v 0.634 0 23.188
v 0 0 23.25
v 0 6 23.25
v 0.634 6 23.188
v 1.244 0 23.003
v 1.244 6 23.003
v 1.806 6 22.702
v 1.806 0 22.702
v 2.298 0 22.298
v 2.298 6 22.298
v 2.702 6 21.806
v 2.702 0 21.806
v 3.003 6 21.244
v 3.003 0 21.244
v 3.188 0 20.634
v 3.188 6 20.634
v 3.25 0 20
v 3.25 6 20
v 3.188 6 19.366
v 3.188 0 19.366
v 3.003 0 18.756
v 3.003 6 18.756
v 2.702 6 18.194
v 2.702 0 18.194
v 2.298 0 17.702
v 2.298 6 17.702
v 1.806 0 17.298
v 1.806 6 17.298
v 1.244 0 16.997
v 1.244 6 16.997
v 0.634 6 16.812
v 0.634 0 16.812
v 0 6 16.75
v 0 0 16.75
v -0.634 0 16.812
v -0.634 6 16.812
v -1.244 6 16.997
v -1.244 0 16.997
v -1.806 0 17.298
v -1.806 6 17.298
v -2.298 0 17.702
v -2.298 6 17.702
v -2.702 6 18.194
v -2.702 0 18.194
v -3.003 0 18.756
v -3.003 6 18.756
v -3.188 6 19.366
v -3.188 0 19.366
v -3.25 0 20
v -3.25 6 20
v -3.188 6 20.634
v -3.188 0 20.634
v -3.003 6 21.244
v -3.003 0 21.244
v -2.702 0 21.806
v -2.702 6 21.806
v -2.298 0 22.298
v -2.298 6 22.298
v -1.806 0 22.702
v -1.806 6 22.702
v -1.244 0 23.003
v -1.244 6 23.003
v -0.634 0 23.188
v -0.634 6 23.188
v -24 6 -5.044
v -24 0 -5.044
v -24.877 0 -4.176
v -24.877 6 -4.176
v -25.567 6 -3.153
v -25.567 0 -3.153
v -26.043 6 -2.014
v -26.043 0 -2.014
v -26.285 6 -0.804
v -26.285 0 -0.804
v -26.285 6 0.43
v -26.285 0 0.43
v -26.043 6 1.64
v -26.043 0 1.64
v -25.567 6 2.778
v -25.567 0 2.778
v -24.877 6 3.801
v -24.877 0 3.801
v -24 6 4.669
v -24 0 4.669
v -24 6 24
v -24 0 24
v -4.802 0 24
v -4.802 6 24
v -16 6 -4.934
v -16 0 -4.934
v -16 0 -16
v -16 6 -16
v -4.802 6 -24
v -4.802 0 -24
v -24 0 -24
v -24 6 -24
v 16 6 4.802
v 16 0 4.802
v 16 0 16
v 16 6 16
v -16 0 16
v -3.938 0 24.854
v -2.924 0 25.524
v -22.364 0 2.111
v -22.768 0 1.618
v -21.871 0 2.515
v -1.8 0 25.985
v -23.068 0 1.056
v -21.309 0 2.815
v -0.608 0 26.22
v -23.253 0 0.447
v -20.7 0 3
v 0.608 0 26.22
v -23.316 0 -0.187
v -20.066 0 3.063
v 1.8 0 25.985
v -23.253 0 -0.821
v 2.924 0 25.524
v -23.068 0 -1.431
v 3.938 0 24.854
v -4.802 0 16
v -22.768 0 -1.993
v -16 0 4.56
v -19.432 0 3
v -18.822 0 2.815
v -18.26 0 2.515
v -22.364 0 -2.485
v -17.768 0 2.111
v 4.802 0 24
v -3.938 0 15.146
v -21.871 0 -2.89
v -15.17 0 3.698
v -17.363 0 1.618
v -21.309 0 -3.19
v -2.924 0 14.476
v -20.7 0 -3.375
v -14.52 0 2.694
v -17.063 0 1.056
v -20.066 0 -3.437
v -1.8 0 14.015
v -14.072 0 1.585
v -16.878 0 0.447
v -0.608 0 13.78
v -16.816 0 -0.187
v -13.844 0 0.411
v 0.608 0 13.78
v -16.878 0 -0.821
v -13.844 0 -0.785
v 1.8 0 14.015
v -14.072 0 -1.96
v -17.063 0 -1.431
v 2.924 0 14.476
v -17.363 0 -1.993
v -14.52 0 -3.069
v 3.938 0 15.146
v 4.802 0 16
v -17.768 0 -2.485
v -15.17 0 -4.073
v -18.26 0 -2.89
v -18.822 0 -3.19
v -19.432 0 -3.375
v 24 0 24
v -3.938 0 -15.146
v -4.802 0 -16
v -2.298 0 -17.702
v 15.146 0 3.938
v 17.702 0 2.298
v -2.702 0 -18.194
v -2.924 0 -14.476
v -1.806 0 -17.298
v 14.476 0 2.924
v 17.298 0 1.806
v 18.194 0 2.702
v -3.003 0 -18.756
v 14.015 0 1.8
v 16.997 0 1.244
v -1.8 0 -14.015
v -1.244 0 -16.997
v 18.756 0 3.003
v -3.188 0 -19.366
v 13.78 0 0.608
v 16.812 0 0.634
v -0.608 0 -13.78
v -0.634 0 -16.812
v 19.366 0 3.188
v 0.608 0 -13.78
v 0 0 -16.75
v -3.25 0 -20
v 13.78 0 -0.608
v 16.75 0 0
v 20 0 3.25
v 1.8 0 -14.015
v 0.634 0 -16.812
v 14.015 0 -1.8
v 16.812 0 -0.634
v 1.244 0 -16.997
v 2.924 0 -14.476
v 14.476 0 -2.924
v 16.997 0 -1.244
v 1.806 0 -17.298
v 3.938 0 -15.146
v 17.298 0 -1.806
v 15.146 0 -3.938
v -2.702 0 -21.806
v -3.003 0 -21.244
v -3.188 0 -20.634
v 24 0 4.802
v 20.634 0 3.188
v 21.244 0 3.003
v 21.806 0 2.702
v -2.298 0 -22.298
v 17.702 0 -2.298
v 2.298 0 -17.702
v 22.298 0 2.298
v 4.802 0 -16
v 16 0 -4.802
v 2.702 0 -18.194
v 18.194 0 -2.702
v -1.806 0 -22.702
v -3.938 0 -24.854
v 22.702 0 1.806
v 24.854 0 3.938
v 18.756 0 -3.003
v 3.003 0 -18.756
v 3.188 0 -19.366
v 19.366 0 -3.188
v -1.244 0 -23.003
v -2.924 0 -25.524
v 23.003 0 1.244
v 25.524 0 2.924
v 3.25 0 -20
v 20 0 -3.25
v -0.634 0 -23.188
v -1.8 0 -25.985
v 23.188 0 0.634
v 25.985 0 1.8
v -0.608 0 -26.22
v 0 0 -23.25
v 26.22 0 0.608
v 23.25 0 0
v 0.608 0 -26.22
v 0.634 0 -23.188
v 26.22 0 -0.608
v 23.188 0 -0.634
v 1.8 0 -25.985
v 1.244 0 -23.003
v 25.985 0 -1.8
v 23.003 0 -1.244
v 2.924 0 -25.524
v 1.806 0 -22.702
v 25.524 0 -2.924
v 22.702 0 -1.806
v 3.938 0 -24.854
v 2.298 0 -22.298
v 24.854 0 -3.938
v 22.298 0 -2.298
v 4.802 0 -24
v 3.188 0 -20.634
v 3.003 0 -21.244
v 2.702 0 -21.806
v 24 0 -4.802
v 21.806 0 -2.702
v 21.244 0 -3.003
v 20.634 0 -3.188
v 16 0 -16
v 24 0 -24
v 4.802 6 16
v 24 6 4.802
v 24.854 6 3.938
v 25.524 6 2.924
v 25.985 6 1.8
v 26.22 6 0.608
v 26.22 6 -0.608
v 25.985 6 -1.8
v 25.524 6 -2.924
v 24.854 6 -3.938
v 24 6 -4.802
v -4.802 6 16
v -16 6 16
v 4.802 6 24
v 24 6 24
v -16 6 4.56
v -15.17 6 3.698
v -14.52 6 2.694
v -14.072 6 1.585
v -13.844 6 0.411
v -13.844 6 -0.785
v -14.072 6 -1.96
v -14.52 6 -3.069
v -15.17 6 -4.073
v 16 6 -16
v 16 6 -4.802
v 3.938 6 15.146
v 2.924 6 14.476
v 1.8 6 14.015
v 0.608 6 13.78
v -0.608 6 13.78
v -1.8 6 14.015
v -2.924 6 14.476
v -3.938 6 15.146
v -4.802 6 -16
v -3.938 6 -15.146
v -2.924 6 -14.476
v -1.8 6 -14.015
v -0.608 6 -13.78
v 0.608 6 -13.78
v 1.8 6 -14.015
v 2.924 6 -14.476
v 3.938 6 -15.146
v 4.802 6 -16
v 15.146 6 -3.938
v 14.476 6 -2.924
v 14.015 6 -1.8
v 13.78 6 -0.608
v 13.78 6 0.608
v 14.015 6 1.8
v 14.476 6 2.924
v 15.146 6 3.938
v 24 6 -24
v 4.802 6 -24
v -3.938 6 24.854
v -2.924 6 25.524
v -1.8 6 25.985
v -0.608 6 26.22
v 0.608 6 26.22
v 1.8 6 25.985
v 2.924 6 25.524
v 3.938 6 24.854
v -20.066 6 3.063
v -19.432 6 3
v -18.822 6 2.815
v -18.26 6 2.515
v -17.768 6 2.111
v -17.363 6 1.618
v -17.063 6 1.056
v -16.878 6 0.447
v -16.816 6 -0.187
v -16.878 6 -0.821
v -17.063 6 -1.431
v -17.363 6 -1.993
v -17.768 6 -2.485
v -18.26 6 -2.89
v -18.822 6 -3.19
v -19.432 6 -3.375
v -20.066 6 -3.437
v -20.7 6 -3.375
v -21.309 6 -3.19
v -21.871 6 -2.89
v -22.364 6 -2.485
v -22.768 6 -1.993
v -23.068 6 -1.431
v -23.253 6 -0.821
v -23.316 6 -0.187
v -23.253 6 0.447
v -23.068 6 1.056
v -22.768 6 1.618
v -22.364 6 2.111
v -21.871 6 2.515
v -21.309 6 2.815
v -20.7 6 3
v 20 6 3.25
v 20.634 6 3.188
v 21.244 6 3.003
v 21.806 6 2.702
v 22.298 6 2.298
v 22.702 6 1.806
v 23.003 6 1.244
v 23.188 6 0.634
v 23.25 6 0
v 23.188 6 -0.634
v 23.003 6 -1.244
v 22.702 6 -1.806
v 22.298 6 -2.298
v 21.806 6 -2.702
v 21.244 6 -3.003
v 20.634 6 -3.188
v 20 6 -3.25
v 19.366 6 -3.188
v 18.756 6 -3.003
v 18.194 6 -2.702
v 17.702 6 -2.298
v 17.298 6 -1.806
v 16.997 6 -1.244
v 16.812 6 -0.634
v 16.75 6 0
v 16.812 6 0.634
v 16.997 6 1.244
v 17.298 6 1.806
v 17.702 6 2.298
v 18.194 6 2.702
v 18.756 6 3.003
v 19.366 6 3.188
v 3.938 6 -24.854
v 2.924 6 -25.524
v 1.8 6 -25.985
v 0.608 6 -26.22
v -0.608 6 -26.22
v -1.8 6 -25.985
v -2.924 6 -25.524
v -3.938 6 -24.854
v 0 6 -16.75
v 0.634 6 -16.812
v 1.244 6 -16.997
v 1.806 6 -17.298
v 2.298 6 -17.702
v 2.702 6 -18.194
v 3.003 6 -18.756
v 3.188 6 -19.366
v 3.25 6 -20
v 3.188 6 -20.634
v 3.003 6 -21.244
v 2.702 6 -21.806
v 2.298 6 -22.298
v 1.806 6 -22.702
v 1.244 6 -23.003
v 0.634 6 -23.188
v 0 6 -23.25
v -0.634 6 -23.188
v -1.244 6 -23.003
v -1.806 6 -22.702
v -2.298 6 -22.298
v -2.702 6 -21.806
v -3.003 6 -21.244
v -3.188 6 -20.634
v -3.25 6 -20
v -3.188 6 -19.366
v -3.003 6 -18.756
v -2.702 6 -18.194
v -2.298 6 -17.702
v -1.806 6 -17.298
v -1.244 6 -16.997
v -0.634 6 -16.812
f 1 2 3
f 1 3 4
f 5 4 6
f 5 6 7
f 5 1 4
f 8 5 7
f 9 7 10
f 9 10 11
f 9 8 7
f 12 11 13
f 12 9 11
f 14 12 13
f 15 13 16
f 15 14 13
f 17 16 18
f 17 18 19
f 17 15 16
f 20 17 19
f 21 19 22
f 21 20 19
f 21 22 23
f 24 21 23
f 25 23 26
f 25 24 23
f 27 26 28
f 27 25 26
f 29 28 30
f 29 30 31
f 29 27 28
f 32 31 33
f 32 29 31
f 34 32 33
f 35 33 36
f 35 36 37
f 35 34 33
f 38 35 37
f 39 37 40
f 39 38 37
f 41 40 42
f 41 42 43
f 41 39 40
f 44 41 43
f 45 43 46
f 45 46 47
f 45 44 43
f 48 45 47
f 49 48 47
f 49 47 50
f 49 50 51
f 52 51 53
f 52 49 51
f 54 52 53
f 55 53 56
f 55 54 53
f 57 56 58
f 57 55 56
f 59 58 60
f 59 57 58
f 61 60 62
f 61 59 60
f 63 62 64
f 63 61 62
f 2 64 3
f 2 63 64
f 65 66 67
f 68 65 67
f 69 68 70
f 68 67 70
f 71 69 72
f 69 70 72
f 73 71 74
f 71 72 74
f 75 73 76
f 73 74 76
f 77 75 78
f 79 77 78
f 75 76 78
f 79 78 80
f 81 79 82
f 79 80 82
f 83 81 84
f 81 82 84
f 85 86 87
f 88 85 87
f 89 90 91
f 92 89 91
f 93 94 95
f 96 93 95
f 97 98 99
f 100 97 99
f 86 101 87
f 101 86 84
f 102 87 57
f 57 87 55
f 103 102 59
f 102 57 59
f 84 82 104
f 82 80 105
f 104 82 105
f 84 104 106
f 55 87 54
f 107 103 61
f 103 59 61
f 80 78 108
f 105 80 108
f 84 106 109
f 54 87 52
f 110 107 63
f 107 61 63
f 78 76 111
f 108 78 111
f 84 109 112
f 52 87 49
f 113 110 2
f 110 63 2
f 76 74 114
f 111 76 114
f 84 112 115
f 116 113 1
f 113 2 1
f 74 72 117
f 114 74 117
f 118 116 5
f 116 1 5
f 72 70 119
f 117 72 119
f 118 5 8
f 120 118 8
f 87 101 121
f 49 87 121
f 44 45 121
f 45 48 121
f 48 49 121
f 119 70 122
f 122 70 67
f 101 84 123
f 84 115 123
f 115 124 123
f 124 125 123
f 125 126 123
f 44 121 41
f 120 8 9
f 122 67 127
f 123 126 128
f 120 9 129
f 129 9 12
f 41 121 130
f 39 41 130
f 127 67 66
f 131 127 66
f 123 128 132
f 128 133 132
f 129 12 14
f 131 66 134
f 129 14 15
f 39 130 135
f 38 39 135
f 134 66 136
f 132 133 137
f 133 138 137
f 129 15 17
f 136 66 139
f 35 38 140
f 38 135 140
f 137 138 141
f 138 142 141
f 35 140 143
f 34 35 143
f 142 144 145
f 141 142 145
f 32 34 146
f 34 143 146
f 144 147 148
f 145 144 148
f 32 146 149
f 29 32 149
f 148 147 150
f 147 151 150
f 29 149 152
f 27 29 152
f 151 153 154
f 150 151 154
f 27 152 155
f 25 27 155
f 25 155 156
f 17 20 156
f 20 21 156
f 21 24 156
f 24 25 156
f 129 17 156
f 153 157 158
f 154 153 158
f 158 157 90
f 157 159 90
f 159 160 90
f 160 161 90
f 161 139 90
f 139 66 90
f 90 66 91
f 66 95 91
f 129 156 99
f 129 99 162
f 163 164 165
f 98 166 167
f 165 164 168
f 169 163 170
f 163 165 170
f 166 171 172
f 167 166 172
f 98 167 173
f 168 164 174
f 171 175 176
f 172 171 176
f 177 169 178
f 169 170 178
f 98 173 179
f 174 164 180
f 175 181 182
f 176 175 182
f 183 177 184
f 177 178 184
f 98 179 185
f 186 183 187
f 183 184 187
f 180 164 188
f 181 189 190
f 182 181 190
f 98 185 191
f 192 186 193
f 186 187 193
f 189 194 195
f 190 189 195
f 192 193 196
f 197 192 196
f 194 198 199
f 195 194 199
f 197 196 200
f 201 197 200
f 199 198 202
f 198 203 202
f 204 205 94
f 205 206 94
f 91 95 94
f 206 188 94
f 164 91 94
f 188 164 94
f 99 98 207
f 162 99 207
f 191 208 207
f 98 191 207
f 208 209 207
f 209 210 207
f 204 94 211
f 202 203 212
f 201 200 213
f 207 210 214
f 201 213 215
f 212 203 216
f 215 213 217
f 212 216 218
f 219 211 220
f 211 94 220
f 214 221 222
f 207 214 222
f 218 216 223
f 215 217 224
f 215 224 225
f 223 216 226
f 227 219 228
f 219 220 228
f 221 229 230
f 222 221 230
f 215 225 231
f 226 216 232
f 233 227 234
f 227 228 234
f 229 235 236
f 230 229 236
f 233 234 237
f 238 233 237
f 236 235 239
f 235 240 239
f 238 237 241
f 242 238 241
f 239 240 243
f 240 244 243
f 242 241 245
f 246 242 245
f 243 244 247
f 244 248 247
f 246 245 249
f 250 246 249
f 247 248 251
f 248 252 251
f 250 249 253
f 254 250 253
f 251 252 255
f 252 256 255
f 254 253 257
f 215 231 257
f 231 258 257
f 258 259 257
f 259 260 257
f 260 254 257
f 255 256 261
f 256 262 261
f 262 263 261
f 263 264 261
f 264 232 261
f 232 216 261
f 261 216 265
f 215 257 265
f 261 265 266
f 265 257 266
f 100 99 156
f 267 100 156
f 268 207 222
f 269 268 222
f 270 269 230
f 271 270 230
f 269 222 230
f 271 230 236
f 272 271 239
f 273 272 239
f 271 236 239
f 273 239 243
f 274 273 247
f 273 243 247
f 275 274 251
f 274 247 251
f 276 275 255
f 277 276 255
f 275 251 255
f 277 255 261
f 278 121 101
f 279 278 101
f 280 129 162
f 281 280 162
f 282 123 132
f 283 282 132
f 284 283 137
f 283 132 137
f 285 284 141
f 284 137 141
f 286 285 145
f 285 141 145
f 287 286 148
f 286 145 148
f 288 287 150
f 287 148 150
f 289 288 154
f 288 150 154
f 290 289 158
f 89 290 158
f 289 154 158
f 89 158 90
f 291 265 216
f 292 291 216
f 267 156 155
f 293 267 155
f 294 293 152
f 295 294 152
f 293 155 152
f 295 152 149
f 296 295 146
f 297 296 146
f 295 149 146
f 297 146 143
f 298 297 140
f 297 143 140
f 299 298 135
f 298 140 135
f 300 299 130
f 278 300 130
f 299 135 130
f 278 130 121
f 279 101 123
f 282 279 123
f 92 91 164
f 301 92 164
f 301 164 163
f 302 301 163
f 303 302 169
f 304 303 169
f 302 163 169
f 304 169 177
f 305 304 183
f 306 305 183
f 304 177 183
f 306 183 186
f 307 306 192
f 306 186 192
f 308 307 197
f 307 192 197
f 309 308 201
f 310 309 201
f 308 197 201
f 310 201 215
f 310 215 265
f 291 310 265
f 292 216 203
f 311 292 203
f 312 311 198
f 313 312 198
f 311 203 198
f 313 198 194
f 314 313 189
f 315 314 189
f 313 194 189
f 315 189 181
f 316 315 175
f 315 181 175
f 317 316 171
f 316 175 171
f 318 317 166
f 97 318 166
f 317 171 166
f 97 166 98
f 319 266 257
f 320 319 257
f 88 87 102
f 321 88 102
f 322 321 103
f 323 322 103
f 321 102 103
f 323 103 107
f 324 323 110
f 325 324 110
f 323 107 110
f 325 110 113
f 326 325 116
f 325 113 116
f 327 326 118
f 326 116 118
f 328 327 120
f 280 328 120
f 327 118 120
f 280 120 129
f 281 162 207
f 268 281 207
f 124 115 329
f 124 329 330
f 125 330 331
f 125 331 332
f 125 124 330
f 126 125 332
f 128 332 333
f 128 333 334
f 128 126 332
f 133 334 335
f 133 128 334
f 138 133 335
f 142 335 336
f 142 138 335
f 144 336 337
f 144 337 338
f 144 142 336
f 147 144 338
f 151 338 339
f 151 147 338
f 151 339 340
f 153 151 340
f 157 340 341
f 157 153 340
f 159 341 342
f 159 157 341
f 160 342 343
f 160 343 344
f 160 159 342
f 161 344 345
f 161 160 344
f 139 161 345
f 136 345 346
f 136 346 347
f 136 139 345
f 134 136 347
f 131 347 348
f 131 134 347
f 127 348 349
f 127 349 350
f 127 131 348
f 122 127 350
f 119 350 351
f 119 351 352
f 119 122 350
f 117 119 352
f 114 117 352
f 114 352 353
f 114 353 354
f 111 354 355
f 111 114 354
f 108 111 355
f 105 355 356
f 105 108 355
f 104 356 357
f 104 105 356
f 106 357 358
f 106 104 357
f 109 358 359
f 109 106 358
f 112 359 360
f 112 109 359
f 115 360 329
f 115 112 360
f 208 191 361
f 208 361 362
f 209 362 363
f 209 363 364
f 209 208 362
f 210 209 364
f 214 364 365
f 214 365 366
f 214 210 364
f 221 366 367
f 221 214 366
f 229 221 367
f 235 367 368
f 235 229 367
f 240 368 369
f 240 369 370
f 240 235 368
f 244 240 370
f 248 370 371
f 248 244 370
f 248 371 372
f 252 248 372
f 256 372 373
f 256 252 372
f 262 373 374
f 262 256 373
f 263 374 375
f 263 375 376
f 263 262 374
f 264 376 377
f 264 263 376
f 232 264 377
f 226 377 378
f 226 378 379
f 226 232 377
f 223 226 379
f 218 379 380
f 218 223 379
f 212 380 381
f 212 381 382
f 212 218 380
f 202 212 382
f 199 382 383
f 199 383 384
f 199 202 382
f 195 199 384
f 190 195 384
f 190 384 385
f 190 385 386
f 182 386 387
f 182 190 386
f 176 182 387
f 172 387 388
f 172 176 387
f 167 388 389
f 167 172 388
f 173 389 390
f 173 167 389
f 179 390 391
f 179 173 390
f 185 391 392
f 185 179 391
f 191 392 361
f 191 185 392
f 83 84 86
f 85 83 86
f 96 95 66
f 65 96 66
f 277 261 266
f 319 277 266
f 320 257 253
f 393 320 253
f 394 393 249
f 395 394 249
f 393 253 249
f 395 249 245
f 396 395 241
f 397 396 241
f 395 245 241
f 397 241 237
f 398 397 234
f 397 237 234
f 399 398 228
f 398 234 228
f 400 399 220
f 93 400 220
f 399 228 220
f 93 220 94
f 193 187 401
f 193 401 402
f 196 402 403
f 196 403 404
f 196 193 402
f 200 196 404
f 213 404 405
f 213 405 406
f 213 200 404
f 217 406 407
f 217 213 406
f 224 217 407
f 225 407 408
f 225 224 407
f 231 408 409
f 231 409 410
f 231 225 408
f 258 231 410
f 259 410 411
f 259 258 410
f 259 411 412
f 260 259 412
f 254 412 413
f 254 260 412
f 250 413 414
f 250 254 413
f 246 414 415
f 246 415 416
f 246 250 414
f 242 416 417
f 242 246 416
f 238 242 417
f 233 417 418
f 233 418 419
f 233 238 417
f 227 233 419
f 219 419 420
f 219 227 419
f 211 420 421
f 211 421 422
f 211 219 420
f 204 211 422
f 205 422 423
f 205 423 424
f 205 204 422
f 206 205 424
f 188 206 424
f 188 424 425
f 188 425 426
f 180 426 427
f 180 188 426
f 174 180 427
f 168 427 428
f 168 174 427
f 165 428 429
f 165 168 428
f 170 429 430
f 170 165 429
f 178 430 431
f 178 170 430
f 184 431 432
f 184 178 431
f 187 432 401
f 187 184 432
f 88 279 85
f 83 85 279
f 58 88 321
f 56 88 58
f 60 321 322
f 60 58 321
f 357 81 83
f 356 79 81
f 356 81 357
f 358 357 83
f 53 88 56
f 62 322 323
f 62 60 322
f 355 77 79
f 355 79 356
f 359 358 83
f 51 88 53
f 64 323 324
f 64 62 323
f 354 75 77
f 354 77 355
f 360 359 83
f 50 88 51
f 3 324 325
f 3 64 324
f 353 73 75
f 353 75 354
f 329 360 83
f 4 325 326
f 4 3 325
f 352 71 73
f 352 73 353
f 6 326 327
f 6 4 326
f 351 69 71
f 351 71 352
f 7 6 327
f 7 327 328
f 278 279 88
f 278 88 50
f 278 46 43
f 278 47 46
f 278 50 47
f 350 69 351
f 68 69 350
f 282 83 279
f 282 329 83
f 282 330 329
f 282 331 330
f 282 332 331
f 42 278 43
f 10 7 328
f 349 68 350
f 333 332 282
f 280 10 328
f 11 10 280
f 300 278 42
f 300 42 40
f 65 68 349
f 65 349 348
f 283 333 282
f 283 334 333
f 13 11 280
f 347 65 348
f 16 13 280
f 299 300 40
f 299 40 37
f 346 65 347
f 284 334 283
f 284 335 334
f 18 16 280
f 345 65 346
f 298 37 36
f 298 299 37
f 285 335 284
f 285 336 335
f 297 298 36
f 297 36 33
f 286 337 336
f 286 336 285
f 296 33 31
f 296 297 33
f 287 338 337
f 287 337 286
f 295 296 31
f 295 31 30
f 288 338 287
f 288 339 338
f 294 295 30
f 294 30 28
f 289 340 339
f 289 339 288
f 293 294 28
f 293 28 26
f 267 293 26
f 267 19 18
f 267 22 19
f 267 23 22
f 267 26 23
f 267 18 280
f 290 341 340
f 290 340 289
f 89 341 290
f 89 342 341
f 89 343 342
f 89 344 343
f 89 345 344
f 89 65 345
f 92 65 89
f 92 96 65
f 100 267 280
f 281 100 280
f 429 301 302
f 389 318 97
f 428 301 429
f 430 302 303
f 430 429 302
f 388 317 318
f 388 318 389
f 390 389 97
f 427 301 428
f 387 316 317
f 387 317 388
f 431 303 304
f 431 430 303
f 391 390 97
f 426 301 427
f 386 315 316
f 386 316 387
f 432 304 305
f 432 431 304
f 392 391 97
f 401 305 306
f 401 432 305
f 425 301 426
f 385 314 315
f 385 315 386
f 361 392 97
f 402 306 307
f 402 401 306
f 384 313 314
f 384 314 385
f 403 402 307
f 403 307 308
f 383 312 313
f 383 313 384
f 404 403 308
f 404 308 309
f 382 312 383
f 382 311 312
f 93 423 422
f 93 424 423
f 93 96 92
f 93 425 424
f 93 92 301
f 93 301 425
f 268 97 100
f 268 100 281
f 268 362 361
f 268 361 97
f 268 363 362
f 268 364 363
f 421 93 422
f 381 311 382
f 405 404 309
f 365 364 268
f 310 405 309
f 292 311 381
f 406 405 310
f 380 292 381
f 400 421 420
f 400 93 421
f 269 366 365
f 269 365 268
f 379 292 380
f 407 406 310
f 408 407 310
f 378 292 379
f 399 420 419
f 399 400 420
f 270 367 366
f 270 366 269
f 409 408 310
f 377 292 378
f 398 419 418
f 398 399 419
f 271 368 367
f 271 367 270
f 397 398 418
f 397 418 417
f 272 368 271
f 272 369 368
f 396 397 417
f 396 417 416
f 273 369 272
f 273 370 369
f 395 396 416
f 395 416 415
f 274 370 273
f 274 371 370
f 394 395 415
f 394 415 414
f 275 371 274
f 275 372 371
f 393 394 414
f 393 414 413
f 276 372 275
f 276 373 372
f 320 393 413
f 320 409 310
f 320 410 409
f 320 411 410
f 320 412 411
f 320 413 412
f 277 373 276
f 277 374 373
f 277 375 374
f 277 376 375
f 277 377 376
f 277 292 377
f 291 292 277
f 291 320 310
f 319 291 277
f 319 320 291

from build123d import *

# Parameters (mm, degrees)
SKETCH1_R           = 3.25
BOSS_EXTRUDE1_DEPTH = 6


with BuildPart() as part:
    # Sketch1 → Boss-Extrude1 (new body)
    with BuildSketch(Plane(origin=(0, 0, 0), x_dir=(1, 0, 0), z_dir=(0, 1, 0))):
        with BuildLine():
            Line((-24, -4.668943148), (-24, -24))
            Line((-24, -24), (-4.802343178, -24))
            ThreePointArc((-4.802343178, -24), (0, -26.25), (4.802343178, -24))
            Line((4.802343178, -24), (24, -24))
            Line((24, -24), (24, -4.802343178))
            ThreePointArc((24, -4.802343178), (26.25, 0), (24, 4.802343178))
            Line((24, 4.802343178), (24, 24))
            Line((24, 24), (4.802343178, 24))
            ThreePointArc((4.802343178, 24), (0, 26.25), (-4.802343178, 24))
            Line((-4.802343178, 24), (-24, 24))
            Line((-24, 24), (-24, 5.04363247))
            ThreePointArc((-24, 5.04363247), (-26.315667945, 0.187344661), (-24, -4.668943148))
        make_face()
        with Locations(Location((-20.065667945, 0.187344661, 0), (0, 0, 270))):
            Circle(SKETCH1_R, mode=Mode.SUBTRACT)
        with Locations(Location((0, 20, 0), (0, 0, 270))):
            Circle(SKETCH1_R, mode=Mode.SUBTRACT)
        with Locations(Location((20, 0, 0), (0, 0, 270))):
            Circle(SKETCH1_R, mode=Mode.SUBTRACT)
        with Locations(Location((0, -20, 0), (0, 0, 270))):
            Circle(SKETCH1_R, mode=Mode.SUBTRACT)
        with BuildLine():
            Line((-16, 16), (-4.802343178, 16))
            ThreePointArc((-4.802343178, 16), (0, 13.75), (4.802343178, 16))
            Line((4.802343178, 16), (16, 16))
            Line((16, 16), (16, 4.802343178))
            ThreePointArc((16, 4.802343178), (13.75, 0), (16, -4.802343178))
            Line((16, -4.802343178), (16, -16))
            Line((16, -16), (4.802343178, -16))
            ThreePointArc((4.802343178, -16), (0, -13.75), (-4.802343178, -16))
            Line((-4.802343178, -16), (-16, -16))
            Line((-16, -16), (-16, -4.559532645))
            ThreePointArc((-16, -4.559532645), (-13.815667945, 0.187344661), (-16, 4.934221967))
            Line((-16, 4.934221967), (-16, 16))
        make_face(mode=Mode.SUBTRACT)
    extrude(amount=BOSS_EXTRUDE1_DEPTH)


solid = part.part
